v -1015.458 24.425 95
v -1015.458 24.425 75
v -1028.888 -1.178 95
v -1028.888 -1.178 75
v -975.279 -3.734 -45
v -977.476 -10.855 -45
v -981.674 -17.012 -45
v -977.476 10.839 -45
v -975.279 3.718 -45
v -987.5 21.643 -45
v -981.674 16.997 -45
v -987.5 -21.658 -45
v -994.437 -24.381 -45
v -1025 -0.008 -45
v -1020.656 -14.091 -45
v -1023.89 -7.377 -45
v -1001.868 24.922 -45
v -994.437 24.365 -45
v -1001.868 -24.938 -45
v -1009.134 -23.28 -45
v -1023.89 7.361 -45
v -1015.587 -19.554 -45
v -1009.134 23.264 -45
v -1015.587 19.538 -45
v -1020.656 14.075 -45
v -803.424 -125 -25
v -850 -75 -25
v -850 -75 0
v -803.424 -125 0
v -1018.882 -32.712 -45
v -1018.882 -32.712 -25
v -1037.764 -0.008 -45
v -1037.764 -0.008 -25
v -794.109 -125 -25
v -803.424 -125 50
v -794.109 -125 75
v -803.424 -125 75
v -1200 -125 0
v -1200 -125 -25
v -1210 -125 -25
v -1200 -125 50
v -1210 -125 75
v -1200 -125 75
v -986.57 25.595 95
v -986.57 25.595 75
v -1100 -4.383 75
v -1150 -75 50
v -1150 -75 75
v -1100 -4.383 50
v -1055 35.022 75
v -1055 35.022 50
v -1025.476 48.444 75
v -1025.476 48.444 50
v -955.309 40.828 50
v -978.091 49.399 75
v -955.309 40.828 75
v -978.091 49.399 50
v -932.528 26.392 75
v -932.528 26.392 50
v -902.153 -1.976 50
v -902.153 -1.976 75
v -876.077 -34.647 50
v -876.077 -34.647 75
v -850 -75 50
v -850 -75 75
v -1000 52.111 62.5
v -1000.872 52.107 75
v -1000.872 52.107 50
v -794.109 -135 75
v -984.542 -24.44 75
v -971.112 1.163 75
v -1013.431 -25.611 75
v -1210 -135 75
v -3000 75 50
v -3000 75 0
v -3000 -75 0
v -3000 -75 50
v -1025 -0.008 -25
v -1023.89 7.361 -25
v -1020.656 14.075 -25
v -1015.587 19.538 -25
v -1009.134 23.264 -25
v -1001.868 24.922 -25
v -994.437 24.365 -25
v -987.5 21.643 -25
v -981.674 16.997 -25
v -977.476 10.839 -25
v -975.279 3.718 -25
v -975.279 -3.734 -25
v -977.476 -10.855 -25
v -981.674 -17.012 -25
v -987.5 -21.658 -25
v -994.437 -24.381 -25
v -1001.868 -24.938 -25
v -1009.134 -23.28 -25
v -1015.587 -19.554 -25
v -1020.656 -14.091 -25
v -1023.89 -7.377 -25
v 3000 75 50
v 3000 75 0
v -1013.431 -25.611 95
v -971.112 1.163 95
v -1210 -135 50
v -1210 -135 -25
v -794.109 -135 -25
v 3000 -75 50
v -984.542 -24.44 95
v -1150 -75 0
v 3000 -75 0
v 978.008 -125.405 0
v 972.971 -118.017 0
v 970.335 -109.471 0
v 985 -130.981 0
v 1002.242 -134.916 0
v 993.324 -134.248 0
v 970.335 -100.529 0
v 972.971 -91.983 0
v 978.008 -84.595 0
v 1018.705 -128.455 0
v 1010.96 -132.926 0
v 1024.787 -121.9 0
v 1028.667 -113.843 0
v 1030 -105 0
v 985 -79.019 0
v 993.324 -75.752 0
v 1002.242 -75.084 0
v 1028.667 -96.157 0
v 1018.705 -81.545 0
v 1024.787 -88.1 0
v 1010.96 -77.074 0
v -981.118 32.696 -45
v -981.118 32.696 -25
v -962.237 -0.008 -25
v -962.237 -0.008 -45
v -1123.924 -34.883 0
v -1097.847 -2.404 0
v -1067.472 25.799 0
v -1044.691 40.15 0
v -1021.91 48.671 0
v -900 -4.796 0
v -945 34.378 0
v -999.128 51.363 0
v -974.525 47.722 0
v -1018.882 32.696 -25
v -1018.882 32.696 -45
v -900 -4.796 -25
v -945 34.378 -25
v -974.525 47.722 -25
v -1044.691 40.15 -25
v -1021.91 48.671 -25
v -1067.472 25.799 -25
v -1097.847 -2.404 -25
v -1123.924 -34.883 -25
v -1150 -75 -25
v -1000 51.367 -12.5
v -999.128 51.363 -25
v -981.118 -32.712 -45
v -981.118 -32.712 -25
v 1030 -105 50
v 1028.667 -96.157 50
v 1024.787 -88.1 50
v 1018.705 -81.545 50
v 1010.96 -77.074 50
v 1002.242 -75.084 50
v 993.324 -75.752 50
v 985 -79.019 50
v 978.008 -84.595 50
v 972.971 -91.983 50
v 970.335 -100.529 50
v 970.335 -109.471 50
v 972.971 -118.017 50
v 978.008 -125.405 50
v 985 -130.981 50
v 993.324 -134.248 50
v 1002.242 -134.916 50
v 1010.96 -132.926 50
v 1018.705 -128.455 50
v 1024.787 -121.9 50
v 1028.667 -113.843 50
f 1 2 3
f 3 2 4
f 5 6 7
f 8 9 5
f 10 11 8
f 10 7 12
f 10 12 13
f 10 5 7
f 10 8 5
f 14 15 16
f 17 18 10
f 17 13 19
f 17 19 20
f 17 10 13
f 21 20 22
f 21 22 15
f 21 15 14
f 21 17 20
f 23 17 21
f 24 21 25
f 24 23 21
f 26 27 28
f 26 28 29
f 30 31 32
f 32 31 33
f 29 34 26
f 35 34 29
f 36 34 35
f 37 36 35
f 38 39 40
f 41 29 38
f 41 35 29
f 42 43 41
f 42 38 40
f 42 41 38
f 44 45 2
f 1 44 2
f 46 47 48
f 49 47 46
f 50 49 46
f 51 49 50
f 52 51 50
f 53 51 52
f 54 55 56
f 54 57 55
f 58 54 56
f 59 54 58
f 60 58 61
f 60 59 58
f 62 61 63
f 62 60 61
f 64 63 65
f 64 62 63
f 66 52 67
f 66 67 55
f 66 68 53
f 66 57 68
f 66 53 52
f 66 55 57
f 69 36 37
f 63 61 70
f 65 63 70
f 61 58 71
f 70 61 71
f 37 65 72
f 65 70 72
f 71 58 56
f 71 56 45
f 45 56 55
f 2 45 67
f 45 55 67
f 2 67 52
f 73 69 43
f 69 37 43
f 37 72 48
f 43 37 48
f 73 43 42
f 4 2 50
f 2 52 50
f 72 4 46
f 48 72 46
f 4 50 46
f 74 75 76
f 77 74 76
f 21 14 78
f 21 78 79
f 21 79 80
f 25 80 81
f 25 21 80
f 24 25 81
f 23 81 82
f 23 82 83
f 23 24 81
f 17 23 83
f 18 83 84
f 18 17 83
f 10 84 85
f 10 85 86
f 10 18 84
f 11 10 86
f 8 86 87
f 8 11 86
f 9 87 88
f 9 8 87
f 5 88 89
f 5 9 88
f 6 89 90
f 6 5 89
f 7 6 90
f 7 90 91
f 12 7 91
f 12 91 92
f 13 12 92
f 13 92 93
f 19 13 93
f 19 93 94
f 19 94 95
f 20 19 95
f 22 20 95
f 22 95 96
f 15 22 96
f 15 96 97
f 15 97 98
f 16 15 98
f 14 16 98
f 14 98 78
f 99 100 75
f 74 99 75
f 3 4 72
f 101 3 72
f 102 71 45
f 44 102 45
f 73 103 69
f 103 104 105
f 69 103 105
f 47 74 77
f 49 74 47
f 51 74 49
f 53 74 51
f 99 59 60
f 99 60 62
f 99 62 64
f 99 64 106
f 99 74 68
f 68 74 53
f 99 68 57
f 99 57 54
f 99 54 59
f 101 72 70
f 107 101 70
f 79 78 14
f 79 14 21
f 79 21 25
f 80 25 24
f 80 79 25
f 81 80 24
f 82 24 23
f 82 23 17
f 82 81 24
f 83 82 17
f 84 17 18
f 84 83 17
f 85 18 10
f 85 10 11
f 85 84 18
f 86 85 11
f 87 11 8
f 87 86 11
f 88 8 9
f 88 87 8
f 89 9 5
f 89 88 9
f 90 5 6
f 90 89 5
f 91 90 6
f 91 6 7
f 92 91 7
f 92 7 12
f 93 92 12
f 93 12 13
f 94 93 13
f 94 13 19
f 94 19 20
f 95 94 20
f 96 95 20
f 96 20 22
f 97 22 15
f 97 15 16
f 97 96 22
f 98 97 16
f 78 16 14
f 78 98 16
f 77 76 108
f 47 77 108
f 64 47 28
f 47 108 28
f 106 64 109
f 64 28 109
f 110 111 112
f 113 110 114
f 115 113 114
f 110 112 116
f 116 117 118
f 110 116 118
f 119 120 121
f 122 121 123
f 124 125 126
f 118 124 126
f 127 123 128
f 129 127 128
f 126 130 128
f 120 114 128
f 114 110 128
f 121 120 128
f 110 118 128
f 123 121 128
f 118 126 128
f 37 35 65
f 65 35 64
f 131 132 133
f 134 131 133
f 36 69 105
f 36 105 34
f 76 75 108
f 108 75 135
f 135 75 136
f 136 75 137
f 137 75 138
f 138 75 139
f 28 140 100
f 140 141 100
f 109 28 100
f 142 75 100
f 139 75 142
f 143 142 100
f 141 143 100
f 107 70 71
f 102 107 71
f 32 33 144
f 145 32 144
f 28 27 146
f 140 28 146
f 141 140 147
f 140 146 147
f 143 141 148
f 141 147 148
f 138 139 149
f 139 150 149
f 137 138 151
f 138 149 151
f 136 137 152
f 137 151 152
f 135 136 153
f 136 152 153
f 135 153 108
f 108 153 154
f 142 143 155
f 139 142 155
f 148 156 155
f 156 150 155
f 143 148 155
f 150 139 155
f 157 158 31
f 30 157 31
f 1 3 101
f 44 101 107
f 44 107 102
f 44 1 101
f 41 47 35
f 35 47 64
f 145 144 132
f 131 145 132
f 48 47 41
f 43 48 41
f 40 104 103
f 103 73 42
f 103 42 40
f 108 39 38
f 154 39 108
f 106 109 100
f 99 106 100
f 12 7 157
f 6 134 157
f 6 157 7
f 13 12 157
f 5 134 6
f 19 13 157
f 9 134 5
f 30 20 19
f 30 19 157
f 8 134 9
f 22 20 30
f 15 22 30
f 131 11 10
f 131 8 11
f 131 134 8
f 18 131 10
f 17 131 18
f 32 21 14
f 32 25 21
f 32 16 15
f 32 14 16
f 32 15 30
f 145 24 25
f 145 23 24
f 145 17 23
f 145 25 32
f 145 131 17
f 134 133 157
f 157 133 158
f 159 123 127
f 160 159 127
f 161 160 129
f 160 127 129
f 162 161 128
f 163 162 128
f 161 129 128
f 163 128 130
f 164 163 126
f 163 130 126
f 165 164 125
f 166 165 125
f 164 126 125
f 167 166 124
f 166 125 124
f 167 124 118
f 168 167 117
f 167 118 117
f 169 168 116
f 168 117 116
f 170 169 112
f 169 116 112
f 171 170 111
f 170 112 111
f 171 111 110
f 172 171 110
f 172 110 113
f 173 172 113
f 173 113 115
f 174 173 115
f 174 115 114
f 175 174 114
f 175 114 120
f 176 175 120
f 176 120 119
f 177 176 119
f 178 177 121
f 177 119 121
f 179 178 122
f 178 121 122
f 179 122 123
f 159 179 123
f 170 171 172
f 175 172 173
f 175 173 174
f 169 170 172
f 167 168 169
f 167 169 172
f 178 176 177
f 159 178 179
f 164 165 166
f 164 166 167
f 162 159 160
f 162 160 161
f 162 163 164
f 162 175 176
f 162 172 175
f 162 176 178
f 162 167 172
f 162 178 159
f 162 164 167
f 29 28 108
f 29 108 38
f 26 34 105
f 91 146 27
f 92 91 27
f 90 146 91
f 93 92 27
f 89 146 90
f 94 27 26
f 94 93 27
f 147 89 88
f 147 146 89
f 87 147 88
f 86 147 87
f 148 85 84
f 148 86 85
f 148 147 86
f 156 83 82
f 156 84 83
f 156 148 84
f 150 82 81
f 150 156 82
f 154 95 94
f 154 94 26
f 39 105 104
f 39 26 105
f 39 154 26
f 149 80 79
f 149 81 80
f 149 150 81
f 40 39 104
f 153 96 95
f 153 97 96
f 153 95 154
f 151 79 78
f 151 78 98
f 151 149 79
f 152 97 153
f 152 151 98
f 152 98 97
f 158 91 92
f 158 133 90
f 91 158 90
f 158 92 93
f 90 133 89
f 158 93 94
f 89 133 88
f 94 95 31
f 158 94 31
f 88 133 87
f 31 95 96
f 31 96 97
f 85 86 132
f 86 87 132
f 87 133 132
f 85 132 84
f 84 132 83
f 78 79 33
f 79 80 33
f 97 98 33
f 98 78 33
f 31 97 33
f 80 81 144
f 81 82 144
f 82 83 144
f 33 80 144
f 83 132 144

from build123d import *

# Parameters (mm, degrees)
SKETCH1_R                = 25
BOSS_EXTRUDE1_DEPTH      = 50
SKETCH1_R_2              = 30
BOSS_EXTRUDE1_2_DEPTH    = 50
SKETCH2_R                = 25
BOSS_EXTRUDE2_DEPTH      = 25
BOSS_EXTRUDE3_DEPTH      = 75
BOSS_EXTRUDE3_DEPTH_BACK = 25
SKETCH3_W                = 415.890953437
SKETCH3_H                = 10
SKETCH6_R                = 25
BOSS_EXTRUDE4_DEPTH      = 25
BOSS_EXTRUDE5_DEPTH      = 20
BOSS_EXTRUDE6_START      = 120
SKETCH10_R               = 25
BOSS_EXTRUDE6_DEPTH      = 120
SKETCH11_R               = 25
BOSS_EXTRUDE8_DEPTH      = 20


with BuildPart() as part:
    # Sketch1 → Boss-Extrude1 (new body)
    with BuildSketch(Plane.XY):
        Polygon((-3000, 75), (-3000, -75), (-1000, -75), (1000, -75), (3000, -75), (3000, 75), align=None)
        with Locations((-1000.00019516, -0.007806401)):
            Circle(SKETCH1_R, mode=Mode.SUBTRACT)
    extrude(amount=BOSS_EXTRUDE1_DEPTH)

    # Sketch2 → Boss-Extrude2 (add)
    with BuildSketch(Plane.XY.offset(50)):
        with BuildLine():
            Line((-1150.00019516, -75), (-1210.00019516, -135))
            Line((-1210.00019516, -135), (-794.109241723, -135))
            Line((-794.109241723, -135), (-850.00019516, -75))
            add(Edge.make_bspline(
                [(-1150.00019516, -75), (-1000.00019516, 179.221874073), (-850.00019516, -75)],
                knots=[0, 0, 0, 1, 1, 1], degree=2))
        make_face()
        with Locations((-1000.00019516, -0.007806401)):
            Circle(SKETCH2_R, mode=Mode.SUBTRACT)
    extrude(amount=BOSS_EXTRUDE2_DEPTH)

    # Sketch3 → Boss-Extrude3 (add, two sides: drawn at the far end of the back side and taken through both)
    with BuildSketch(Plane(origin=(0, 0, 50), x_dir=(-1, 0, 0), z_dir=(0, 0, -1)).offset(-BOSS_EXTRUDE3_DEPTH_BACK)):
        with Locations((1002.054718441, -130)):
            Rectangle(SKETCH3_W, SKETCH3_H)
    extrude(amount=BOSS_EXTRUDE3_DEPTH + BOSS_EXTRUDE3_DEPTH_BACK)

    # Sketch6 → Boss-Extrude4 (add)
    with BuildSketch(Plane(origin=(0, 0, -25), x_dir=(-1, 0, 0), z_dir=(0, 0, -1))):
        with BuildLine():
            Line((803.42440063, -125), (1200.00019516, -125))
            Line((1200.00019516, -125), (1150.00019516, -75))
            add(Edge.make_bspline(
                [(850.00019516, -75), (1000.00019516, 177.73404233), (1150.00019516, -75)],
                knots=[0, 0, 0, 1, 1, 1], degree=2))
            Line((850.00019516, -75), (803.42440063, -125))
        make_face()
        with Locations((1000.00019516, -0.007806401)):
            Circle(SKETCH6_R, mode=Mode.SUBTRACT)
    extrude(amount=-BOSS_EXTRUDE4_DEPTH)

    # Sketch8 → Boss-Extrude5 (add)
    with BuildSketch(Plane.XY.offset(75)):
        Polygon((-986.569847376, 25.59540955), (-1015.4580567, 24.424823937), (-1028.888404484, -1.178392013), (-1013.430542944, -25.611022351), (-984.542333621, -24.440436739), (-971.111985836, 1.162779212), align=None)
    extrude(amount=BOSS_EXTRUDE5_DEPTH)

    # Sketch10 → Boss-Extrude6 (add)
    with BuildSketch(Plane(origin=(0, 0, 75), x_dir=(-1, 0, 0), z_dir=(0, 0, -1)).offset(BOSS_EXTRUDE6_START)):
        with Locations((1000.00019516, -0.007806401)):
            Circle(SKETCH10_R)
    extrude(amount=-BOSS_EXTRUDE6_DEPTH)


with BuildPart() as body_2:
    # Sketch1 → Boss-Extrude1 2 (new body)
    with BuildSketch(Plane.XY):
        with Locations((1000, -105)):
            Circle(SKETCH1_R_2)
    extrude(amount=BOSS_EXTRUDE1_2_DEPTH)


with BuildPart() as body_3:
    # Sketch11 → Boss-Extrude8 (new body)
    with BuildSketch(Plane(origin=(0, 0, -25), x_dir=(-1, 0, 0), z_dir=(0, 0, -1))):
        Polygon((1018.881925628, 32.696310105), (981.118464692, 32.696310105), (962.236734224, -0.007806401), (981.118464692, -32.711922906), (1018.881925628, -32.711922906), (1037.763656096, -0.007806401), align=None)
        with Locations((1000.00019516, -0.007806401)):
            Circle(SKETCH11_R, mode=Mode.SUBTRACT)
    extrude(amount=BOSS_EXTRUDE8_DEPTH)


solid = Compound([part.part, body_2.part, body_3.part])
